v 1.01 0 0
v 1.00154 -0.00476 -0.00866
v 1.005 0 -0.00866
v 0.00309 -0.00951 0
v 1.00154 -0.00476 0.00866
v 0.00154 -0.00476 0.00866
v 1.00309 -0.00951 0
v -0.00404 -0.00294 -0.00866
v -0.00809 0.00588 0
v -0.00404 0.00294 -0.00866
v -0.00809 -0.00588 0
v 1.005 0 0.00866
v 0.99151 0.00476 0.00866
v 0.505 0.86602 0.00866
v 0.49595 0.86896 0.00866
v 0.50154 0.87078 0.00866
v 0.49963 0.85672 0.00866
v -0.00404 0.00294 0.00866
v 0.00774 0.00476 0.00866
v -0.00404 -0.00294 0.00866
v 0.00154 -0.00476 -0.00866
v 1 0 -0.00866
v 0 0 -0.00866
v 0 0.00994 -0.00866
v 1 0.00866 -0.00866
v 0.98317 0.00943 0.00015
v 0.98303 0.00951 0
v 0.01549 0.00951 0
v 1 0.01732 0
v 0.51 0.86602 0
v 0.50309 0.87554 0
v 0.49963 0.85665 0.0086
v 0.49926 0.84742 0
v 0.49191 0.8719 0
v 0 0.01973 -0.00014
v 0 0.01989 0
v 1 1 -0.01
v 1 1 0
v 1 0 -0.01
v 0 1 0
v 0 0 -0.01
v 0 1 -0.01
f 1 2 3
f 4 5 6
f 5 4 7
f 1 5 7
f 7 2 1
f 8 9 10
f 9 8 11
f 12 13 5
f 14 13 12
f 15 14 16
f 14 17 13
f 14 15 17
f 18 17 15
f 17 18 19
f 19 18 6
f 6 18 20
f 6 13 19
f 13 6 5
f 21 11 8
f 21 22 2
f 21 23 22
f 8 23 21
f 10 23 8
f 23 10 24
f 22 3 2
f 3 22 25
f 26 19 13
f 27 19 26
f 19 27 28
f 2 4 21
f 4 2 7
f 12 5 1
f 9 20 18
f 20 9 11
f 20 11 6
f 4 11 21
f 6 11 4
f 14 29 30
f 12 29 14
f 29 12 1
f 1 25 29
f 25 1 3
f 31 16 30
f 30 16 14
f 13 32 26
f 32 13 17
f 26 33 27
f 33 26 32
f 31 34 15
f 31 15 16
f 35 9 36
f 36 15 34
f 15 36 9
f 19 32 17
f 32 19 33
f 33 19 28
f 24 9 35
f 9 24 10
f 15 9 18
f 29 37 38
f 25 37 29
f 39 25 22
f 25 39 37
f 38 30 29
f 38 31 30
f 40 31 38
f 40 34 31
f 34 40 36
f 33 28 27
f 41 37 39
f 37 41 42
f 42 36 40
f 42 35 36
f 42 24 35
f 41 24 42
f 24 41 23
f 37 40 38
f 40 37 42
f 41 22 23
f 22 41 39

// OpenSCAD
hull(){
    translate([0.0, 0.0]) sphere(0.01);
    translate([1.0, 0.0]) sphere(0.01);
}
hull(){
    translate([1.0, 0.0]) sphere(0.01);
    translate([0.5, 0.8660254]) sphere(0.01);
}
hull(){
    translate([0.5, 0.8660254]) sphere(0.01);
    translate([0.0, 0.0]) sphere(0.01);
}
translate([0,0,-0.01]) color([0.1,0.1,0.1]) cube([1,1,0.01]);
